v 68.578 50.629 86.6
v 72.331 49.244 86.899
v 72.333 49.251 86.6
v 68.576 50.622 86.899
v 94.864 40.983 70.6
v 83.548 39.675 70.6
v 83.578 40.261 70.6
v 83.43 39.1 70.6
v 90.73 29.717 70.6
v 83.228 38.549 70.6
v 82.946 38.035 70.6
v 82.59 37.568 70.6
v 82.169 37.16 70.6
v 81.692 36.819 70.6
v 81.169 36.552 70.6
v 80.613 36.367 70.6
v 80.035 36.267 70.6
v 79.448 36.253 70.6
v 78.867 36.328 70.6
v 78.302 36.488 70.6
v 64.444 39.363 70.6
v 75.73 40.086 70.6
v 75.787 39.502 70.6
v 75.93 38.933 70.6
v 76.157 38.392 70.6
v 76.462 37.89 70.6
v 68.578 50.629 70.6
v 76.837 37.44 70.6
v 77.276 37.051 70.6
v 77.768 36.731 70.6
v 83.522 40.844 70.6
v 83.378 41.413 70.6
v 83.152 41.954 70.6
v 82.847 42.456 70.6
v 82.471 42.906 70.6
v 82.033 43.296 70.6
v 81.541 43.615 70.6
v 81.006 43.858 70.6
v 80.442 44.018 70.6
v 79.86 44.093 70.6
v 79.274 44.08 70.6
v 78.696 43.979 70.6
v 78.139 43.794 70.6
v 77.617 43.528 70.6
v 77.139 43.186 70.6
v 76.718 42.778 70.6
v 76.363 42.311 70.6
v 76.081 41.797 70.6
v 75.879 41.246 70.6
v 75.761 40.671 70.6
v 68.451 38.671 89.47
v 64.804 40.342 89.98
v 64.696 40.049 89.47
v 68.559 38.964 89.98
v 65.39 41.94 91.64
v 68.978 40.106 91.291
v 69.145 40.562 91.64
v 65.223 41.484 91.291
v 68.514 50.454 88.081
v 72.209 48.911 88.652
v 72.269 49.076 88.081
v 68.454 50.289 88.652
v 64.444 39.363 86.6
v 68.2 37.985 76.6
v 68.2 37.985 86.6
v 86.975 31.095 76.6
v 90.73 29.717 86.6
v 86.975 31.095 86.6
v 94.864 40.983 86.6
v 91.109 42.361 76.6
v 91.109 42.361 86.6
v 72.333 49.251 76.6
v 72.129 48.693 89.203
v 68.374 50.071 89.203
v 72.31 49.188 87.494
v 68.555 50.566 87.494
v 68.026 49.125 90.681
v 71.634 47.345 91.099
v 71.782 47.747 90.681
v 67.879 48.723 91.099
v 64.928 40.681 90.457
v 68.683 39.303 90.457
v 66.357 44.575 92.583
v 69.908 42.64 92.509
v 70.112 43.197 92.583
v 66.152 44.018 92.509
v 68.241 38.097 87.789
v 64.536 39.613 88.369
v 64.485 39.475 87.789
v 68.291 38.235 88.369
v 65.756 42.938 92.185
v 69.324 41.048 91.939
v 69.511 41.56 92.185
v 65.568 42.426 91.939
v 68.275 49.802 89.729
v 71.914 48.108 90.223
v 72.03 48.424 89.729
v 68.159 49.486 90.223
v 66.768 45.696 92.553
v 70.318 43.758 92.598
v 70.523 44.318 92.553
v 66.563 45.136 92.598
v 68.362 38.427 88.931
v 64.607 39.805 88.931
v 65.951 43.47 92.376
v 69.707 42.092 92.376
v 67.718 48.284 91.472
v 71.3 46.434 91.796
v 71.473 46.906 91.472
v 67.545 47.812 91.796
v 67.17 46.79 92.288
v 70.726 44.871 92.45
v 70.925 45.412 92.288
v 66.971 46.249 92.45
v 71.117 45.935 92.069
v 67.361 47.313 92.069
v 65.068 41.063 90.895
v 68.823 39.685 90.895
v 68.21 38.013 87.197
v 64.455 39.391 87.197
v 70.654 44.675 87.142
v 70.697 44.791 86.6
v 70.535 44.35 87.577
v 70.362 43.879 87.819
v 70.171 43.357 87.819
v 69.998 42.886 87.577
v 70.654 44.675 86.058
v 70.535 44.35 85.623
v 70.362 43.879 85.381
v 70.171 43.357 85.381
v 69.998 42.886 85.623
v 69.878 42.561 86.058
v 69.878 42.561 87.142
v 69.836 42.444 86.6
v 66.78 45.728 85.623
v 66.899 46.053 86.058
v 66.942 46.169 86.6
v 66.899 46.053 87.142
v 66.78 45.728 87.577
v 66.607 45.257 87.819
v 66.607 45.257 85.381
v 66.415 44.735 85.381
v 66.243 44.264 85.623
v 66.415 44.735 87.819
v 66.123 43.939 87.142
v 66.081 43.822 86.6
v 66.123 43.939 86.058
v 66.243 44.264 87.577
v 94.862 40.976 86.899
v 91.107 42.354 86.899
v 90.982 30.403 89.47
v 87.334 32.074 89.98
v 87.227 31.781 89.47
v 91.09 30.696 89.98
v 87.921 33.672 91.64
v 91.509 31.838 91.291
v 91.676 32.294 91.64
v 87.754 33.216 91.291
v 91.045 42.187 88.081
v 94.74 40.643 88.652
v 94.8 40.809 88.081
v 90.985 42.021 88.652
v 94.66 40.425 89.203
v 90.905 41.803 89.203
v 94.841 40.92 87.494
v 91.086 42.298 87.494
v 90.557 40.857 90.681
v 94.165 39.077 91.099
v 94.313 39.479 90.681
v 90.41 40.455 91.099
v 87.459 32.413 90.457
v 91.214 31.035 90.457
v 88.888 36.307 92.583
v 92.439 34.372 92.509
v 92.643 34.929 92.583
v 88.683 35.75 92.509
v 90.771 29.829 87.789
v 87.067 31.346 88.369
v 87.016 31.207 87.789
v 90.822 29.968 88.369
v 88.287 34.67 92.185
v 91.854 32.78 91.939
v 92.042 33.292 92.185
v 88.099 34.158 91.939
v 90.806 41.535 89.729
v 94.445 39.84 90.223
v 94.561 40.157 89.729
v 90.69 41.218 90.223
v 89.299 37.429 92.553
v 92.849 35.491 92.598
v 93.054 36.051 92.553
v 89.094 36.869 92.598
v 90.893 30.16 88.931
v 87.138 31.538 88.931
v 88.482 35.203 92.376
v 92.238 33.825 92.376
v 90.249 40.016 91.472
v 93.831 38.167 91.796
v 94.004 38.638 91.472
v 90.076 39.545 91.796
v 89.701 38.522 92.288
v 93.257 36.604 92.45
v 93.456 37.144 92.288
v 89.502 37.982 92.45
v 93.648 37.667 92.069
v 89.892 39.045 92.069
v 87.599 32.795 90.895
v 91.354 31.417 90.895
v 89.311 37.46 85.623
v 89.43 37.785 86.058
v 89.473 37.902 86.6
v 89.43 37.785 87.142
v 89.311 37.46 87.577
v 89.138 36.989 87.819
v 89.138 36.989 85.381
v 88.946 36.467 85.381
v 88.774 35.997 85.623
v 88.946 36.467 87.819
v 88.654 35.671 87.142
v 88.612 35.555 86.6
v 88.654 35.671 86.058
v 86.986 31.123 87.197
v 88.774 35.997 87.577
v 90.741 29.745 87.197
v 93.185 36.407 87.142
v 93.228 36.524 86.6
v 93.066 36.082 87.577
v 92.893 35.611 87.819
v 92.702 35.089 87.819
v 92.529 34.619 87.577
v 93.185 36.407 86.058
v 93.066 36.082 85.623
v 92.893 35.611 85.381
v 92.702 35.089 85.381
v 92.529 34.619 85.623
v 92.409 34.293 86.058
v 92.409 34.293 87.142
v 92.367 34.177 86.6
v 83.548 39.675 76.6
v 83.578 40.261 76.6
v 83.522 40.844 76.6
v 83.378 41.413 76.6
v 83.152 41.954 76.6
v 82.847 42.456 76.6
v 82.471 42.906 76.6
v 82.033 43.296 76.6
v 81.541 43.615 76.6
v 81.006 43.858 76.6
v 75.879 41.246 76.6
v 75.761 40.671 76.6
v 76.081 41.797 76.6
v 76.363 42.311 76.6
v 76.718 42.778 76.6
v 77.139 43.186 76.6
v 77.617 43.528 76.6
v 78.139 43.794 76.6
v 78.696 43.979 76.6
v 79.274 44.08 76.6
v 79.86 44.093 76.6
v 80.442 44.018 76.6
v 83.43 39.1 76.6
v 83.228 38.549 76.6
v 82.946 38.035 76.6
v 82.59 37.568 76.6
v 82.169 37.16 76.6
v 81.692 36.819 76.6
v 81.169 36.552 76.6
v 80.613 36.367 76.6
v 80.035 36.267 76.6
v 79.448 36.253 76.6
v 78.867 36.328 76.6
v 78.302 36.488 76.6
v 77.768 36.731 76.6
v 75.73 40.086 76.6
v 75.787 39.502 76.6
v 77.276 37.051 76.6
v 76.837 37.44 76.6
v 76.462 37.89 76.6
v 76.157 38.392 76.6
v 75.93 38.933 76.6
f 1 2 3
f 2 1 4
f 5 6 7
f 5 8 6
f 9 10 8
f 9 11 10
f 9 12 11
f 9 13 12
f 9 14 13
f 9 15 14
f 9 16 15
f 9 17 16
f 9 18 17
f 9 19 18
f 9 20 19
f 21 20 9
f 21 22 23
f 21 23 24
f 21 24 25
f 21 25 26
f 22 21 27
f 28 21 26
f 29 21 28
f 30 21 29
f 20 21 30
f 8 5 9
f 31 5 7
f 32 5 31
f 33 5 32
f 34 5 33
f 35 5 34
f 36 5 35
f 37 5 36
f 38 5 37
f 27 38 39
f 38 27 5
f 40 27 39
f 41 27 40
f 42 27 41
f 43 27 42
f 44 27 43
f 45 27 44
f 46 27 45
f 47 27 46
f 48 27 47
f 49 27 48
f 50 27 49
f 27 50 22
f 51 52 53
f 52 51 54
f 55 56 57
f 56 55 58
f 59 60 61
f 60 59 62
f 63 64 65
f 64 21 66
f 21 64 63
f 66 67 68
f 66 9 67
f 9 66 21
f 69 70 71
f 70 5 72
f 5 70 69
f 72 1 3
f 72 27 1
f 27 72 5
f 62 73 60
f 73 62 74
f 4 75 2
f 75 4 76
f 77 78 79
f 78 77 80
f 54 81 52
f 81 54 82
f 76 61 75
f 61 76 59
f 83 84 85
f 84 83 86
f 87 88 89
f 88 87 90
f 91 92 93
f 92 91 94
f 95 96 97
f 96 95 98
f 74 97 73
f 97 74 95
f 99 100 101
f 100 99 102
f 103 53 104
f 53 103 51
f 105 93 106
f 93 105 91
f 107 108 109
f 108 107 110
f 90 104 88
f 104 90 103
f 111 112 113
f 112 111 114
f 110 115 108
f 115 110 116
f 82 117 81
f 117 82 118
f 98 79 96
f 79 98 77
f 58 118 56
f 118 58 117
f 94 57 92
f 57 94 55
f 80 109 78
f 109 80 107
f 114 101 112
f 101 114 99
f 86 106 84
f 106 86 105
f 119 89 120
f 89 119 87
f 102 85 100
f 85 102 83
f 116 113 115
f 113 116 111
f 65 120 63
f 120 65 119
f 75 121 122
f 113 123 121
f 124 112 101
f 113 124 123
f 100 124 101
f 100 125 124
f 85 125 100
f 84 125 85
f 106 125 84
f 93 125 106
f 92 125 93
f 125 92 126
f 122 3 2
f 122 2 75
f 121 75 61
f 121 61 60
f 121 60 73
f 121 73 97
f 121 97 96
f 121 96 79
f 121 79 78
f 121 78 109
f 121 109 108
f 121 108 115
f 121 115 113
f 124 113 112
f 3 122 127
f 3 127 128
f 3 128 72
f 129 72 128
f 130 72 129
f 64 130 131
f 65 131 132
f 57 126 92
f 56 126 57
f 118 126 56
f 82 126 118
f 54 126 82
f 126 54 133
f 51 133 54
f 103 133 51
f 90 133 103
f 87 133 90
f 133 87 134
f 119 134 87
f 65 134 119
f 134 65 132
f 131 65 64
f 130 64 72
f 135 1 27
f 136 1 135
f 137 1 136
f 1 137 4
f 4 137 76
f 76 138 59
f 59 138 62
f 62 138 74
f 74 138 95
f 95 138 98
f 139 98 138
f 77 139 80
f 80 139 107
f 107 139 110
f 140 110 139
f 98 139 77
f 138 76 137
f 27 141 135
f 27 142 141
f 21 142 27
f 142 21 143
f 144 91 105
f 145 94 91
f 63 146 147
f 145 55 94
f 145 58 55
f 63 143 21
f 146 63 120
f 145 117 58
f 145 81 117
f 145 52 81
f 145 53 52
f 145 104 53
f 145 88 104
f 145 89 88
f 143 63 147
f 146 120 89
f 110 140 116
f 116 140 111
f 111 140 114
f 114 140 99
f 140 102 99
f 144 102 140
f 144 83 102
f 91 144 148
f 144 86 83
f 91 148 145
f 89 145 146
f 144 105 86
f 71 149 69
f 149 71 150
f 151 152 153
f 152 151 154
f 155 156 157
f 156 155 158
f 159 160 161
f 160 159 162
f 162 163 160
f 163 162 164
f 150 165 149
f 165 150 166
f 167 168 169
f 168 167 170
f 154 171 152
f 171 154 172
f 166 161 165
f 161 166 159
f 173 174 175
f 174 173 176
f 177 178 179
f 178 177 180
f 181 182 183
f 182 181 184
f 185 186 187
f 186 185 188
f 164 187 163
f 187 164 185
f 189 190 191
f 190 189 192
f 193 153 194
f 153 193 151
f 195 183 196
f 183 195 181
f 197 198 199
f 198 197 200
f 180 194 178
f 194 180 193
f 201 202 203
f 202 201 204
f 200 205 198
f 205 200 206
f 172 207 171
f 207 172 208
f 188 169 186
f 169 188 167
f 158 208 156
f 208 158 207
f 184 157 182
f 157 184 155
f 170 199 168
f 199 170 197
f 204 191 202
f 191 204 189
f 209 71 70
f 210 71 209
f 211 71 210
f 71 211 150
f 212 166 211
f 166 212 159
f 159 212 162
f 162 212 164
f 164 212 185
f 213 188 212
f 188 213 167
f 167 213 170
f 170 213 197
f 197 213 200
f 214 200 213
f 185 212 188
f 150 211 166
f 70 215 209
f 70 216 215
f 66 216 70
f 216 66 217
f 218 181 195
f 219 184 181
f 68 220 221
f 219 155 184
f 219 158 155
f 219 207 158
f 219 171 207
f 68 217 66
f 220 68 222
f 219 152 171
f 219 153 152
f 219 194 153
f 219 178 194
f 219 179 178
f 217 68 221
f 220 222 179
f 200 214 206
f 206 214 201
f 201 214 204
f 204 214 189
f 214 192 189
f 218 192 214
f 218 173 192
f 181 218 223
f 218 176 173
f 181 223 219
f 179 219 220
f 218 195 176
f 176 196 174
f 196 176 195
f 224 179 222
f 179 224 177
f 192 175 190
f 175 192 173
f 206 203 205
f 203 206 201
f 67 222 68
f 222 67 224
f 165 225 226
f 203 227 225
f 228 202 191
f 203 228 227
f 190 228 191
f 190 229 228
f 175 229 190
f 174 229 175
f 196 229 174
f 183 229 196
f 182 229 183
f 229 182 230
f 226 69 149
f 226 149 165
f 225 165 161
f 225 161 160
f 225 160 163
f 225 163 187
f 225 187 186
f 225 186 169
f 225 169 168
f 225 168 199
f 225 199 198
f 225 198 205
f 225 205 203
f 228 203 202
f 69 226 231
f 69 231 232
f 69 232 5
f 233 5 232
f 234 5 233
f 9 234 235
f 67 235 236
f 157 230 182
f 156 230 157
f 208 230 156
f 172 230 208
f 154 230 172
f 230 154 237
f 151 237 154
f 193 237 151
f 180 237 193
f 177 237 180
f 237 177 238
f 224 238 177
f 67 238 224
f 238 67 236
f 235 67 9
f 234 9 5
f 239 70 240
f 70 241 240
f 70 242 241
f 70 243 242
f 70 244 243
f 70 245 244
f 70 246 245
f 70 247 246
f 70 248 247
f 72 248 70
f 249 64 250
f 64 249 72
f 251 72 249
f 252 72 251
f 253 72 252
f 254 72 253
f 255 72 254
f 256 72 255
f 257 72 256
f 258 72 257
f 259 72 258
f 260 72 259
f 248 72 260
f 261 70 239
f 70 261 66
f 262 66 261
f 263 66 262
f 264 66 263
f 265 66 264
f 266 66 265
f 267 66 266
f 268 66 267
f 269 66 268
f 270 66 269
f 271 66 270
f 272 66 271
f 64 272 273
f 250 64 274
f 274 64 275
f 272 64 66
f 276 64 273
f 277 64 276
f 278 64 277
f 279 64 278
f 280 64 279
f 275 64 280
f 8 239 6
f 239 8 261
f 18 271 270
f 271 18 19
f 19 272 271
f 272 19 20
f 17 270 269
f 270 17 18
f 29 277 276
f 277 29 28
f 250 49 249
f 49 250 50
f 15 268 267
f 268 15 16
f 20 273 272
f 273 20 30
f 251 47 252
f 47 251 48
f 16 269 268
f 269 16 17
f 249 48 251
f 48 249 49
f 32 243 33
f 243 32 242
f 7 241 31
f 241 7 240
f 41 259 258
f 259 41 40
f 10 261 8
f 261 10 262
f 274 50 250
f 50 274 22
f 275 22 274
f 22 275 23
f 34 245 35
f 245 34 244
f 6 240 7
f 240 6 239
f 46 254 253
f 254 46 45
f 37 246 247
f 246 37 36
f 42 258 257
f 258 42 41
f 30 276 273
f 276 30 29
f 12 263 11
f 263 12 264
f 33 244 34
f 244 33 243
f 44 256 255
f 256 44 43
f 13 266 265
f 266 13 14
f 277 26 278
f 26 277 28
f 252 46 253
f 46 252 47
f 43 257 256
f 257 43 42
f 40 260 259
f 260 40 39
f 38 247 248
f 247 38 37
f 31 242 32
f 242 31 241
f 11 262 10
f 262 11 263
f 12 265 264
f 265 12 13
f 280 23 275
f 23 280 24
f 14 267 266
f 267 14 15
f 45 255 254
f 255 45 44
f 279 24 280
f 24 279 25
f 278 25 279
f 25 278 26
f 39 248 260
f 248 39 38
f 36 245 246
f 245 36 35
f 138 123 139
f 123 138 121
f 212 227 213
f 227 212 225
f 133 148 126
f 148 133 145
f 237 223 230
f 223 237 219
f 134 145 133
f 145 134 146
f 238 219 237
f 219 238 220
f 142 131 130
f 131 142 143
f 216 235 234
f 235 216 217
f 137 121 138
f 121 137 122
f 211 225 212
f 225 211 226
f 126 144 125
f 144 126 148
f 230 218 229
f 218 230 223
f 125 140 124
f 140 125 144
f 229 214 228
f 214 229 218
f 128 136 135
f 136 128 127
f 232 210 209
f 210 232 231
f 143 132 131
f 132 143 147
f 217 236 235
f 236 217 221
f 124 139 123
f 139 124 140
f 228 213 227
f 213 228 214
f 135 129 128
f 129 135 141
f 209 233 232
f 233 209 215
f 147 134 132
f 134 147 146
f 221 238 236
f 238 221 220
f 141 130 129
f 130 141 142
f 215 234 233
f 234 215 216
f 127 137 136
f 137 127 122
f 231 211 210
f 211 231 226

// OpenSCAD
// file: ../lib/common.scad
// ============================================================================
//  Вспомогательные модули общего назначения.
//  Подключать через use <lib/common.scad> — файл не содержит параметров
//  проекта и ни от чего не зависит.
// ============================================================================

_eps = 0.01;

// --------------------------------------------------------------------- 2D ---
// Прямоугольник со скруглёнными углами, по центру
module rrect(w, d, r) {
    rr = min(r, w/2 - _eps, d/2 - _eps);
    if (rr > 0) offset(r = rr) square([w - 2*rr, d - 2*rr], center = true);
    else square([w, d], center = true);
}

// --------------------------------------------------------------------- 3D ---
// Коробка со скруглением ТОЛЬКО вертикальных рёбер: нижние и верхние острые
module rounded_box(w, d, h, r) linear_extrude(height = h) rrect(w, d, r);

// Цилиндр с фасками на торцах (снимает «слоновью ногу» и облегчает посадку)
module chamfered_cyl(d, h, ch = 0.6, bottom = true, top = true) {
    r  = d/2;
    cb = bottom ? min(ch, h/2) : 0;
    ct = top    ? min(ch, h/2) : 0;
    if (cb <= 0 && ct <= 0) cylinder(d = d, h = h);
    else rotate_extrude(angle = 360) polygon(concat(
        [[0, 0]],
        cb > 0 ? [[r - cb, 0], [r, cb]] : [[r, 0]],
        ct > 0 ? [[r, h - ct], [r - ct, h]] : [[r, h]],
        [[0, h]]));
}

// Труба
module tube(od, id, h) difference() {
    cylinder(d = od, h = h);
    translate([0, 0, -_eps]) cylinder(d = id, h = h + 2*_eps);
}

// Сквозное отверстие, растянутое вверх-вниз для гарантированного вычитания
module thru(d, h) translate([0, 0, -_eps]) cylinder(d = d, h = h + 2*_eps);

// Потайное отверстие под саморез с конической головкой.
// Пластина занимает z = [0 .. t], головка утапливается сверху,
// саморез идёт вниз (в ответную стойку).
module countersunk_hole(free_d, head_d, t, down = 30) {
    cone_h = (head_d - free_d)/2;    // головка 90 градусов
    union() {
        translate([0, 0, -down]) cylinder(d = free_d, h = down + t - cone_h + _eps);
        translate([0, 0, t - cone_h]) cylinder(d1 = free_d, d2 = head_d, h = cone_h);
    }
}

// Паз (щелевое отверстие) длиной len по X, сквозной по высоте h
module slot(len, d, h) hull() for (s = [-1, 1])
    translate([s*(len - d)/2, 0, 0]) cylinder(d = d, h = h);

// Стойка под саморез: цилиндр с пилотным отверстием сверху.
// Снизу фаски нет — стойка растёт из дна детали.
module screw_boss(od, h, pilot_d, pilot_depth, ch = 0.6) difference() {
    chamfered_cyl(od, h, ch = ch, bottom = false, top = true);
    translate([0, 0, h - pilot_depth]) cylinder(d = pilot_d, h = pilot_depth + _eps);
}

// Треугольная косынка в плоскости XZ (катеты l по X и h по Z), толщина t по Y
module gusset(l, h, t) translate([0, -t/2, 0]) linear_extrude(height = t)
    polygon([[0, 0], [l, 0], [0, h]]);

// Конусное гнездо под заточенный винт-ось (ось Z вниз от z=0)
module cone_seat(d, depth) translate([0, 0, -depth])
    cylinder(d1 = 0.2, d2 = d, h = depth + _eps);

// Канавка под круглый пассик: тор, вычитаемый из обода
module belt_groove(pulley_d, groove_r) rotate_extrude(angle = 360)
    translate([pulley_d/2, 0]) circle(r = groove_r);

// Сетка облегчающих отверстий по кругу
module radial_holes(n, r, d, h) for (i = [0 : n - 1])
    rotate([0, 0, i*360/n]) translate([r, 0, 0]) thru(d, h);
// main file
// ============================================================================
//  ВИЛКА ТОНАРМА
//
//  Вращается вместе с трубкой вокруг вертикальной оси (палец в стойке),
//  а трубка качается в вилке на двух винтах M3 с заточенными концами —
//  они входят в конусные гнёзда ступицы. Это простейший кардан:
//  зазор выставляется глубиной завинчивания винтов.
//
//  Печать: как есть, нижней плоскостью траверсы на стол — стойки
//  печатаются вверх, поддержки не нужны.
// ============================================================================

include <../params.scad>
use <../lib/common.scad>

module tonearm_yoke(az = arm_tube_azimuth_at(arm_groove_r_out)) {
    bar_w  = arm_yoke_gap + 2*arm_yoke_upright_t;
    up_y   = arm_yoke_gap/2 + arm_yoke_upright_t/2;
    translate([arm_pivot_pos[0], arm_pivot_pos[1], 0]) rotate([0, 0, az])
        difference() {
            union() {
                // траверса
                translate([0, 0, arm_pillar_top_z])
                    linear_extrude(height = arm_yoke_bar_t)
                        rrect(arm_yoke_upright_w, bar_w, 3);
                // стойки вилки со скруглённым верхом
                for (s = [-1, 1]) translate([0, s*up_y, 0]) hull() {
                    translate([-arm_yoke_upright_w/2, -arm_yoke_upright_t/2,
                               arm_pillar_top_z])
                        cube([arm_yoke_upright_w, arm_yoke_upright_t,
                              arm_axis_z - arm_pillar_top_z]);
                    translate([0, 0, arm_axis_z]) rotate([90, 0, 0])
                        cylinder(d = arm_yoke_upright_w, h = arm_yoke_upright_t,
                                 center = true);
                }
            }
            // посадка пальца вертикальной оси (с натягом)
            translate([0, 0, arm_pillar_top_z - eps])
                cylinder(d = arm_pivot_shaft_d - 0.15, h = arm_yoke_bar_t + 2*eps);
            // пилотные отверстия винтов-осей качания
            translate([0, 0, arm_axis_z]) rotate([90, 0, 0])
                cylinder(d = arm_pivot_screw_pilot, h = bar_w + 10, center = true);
        }
}

tonearm_yoke();
